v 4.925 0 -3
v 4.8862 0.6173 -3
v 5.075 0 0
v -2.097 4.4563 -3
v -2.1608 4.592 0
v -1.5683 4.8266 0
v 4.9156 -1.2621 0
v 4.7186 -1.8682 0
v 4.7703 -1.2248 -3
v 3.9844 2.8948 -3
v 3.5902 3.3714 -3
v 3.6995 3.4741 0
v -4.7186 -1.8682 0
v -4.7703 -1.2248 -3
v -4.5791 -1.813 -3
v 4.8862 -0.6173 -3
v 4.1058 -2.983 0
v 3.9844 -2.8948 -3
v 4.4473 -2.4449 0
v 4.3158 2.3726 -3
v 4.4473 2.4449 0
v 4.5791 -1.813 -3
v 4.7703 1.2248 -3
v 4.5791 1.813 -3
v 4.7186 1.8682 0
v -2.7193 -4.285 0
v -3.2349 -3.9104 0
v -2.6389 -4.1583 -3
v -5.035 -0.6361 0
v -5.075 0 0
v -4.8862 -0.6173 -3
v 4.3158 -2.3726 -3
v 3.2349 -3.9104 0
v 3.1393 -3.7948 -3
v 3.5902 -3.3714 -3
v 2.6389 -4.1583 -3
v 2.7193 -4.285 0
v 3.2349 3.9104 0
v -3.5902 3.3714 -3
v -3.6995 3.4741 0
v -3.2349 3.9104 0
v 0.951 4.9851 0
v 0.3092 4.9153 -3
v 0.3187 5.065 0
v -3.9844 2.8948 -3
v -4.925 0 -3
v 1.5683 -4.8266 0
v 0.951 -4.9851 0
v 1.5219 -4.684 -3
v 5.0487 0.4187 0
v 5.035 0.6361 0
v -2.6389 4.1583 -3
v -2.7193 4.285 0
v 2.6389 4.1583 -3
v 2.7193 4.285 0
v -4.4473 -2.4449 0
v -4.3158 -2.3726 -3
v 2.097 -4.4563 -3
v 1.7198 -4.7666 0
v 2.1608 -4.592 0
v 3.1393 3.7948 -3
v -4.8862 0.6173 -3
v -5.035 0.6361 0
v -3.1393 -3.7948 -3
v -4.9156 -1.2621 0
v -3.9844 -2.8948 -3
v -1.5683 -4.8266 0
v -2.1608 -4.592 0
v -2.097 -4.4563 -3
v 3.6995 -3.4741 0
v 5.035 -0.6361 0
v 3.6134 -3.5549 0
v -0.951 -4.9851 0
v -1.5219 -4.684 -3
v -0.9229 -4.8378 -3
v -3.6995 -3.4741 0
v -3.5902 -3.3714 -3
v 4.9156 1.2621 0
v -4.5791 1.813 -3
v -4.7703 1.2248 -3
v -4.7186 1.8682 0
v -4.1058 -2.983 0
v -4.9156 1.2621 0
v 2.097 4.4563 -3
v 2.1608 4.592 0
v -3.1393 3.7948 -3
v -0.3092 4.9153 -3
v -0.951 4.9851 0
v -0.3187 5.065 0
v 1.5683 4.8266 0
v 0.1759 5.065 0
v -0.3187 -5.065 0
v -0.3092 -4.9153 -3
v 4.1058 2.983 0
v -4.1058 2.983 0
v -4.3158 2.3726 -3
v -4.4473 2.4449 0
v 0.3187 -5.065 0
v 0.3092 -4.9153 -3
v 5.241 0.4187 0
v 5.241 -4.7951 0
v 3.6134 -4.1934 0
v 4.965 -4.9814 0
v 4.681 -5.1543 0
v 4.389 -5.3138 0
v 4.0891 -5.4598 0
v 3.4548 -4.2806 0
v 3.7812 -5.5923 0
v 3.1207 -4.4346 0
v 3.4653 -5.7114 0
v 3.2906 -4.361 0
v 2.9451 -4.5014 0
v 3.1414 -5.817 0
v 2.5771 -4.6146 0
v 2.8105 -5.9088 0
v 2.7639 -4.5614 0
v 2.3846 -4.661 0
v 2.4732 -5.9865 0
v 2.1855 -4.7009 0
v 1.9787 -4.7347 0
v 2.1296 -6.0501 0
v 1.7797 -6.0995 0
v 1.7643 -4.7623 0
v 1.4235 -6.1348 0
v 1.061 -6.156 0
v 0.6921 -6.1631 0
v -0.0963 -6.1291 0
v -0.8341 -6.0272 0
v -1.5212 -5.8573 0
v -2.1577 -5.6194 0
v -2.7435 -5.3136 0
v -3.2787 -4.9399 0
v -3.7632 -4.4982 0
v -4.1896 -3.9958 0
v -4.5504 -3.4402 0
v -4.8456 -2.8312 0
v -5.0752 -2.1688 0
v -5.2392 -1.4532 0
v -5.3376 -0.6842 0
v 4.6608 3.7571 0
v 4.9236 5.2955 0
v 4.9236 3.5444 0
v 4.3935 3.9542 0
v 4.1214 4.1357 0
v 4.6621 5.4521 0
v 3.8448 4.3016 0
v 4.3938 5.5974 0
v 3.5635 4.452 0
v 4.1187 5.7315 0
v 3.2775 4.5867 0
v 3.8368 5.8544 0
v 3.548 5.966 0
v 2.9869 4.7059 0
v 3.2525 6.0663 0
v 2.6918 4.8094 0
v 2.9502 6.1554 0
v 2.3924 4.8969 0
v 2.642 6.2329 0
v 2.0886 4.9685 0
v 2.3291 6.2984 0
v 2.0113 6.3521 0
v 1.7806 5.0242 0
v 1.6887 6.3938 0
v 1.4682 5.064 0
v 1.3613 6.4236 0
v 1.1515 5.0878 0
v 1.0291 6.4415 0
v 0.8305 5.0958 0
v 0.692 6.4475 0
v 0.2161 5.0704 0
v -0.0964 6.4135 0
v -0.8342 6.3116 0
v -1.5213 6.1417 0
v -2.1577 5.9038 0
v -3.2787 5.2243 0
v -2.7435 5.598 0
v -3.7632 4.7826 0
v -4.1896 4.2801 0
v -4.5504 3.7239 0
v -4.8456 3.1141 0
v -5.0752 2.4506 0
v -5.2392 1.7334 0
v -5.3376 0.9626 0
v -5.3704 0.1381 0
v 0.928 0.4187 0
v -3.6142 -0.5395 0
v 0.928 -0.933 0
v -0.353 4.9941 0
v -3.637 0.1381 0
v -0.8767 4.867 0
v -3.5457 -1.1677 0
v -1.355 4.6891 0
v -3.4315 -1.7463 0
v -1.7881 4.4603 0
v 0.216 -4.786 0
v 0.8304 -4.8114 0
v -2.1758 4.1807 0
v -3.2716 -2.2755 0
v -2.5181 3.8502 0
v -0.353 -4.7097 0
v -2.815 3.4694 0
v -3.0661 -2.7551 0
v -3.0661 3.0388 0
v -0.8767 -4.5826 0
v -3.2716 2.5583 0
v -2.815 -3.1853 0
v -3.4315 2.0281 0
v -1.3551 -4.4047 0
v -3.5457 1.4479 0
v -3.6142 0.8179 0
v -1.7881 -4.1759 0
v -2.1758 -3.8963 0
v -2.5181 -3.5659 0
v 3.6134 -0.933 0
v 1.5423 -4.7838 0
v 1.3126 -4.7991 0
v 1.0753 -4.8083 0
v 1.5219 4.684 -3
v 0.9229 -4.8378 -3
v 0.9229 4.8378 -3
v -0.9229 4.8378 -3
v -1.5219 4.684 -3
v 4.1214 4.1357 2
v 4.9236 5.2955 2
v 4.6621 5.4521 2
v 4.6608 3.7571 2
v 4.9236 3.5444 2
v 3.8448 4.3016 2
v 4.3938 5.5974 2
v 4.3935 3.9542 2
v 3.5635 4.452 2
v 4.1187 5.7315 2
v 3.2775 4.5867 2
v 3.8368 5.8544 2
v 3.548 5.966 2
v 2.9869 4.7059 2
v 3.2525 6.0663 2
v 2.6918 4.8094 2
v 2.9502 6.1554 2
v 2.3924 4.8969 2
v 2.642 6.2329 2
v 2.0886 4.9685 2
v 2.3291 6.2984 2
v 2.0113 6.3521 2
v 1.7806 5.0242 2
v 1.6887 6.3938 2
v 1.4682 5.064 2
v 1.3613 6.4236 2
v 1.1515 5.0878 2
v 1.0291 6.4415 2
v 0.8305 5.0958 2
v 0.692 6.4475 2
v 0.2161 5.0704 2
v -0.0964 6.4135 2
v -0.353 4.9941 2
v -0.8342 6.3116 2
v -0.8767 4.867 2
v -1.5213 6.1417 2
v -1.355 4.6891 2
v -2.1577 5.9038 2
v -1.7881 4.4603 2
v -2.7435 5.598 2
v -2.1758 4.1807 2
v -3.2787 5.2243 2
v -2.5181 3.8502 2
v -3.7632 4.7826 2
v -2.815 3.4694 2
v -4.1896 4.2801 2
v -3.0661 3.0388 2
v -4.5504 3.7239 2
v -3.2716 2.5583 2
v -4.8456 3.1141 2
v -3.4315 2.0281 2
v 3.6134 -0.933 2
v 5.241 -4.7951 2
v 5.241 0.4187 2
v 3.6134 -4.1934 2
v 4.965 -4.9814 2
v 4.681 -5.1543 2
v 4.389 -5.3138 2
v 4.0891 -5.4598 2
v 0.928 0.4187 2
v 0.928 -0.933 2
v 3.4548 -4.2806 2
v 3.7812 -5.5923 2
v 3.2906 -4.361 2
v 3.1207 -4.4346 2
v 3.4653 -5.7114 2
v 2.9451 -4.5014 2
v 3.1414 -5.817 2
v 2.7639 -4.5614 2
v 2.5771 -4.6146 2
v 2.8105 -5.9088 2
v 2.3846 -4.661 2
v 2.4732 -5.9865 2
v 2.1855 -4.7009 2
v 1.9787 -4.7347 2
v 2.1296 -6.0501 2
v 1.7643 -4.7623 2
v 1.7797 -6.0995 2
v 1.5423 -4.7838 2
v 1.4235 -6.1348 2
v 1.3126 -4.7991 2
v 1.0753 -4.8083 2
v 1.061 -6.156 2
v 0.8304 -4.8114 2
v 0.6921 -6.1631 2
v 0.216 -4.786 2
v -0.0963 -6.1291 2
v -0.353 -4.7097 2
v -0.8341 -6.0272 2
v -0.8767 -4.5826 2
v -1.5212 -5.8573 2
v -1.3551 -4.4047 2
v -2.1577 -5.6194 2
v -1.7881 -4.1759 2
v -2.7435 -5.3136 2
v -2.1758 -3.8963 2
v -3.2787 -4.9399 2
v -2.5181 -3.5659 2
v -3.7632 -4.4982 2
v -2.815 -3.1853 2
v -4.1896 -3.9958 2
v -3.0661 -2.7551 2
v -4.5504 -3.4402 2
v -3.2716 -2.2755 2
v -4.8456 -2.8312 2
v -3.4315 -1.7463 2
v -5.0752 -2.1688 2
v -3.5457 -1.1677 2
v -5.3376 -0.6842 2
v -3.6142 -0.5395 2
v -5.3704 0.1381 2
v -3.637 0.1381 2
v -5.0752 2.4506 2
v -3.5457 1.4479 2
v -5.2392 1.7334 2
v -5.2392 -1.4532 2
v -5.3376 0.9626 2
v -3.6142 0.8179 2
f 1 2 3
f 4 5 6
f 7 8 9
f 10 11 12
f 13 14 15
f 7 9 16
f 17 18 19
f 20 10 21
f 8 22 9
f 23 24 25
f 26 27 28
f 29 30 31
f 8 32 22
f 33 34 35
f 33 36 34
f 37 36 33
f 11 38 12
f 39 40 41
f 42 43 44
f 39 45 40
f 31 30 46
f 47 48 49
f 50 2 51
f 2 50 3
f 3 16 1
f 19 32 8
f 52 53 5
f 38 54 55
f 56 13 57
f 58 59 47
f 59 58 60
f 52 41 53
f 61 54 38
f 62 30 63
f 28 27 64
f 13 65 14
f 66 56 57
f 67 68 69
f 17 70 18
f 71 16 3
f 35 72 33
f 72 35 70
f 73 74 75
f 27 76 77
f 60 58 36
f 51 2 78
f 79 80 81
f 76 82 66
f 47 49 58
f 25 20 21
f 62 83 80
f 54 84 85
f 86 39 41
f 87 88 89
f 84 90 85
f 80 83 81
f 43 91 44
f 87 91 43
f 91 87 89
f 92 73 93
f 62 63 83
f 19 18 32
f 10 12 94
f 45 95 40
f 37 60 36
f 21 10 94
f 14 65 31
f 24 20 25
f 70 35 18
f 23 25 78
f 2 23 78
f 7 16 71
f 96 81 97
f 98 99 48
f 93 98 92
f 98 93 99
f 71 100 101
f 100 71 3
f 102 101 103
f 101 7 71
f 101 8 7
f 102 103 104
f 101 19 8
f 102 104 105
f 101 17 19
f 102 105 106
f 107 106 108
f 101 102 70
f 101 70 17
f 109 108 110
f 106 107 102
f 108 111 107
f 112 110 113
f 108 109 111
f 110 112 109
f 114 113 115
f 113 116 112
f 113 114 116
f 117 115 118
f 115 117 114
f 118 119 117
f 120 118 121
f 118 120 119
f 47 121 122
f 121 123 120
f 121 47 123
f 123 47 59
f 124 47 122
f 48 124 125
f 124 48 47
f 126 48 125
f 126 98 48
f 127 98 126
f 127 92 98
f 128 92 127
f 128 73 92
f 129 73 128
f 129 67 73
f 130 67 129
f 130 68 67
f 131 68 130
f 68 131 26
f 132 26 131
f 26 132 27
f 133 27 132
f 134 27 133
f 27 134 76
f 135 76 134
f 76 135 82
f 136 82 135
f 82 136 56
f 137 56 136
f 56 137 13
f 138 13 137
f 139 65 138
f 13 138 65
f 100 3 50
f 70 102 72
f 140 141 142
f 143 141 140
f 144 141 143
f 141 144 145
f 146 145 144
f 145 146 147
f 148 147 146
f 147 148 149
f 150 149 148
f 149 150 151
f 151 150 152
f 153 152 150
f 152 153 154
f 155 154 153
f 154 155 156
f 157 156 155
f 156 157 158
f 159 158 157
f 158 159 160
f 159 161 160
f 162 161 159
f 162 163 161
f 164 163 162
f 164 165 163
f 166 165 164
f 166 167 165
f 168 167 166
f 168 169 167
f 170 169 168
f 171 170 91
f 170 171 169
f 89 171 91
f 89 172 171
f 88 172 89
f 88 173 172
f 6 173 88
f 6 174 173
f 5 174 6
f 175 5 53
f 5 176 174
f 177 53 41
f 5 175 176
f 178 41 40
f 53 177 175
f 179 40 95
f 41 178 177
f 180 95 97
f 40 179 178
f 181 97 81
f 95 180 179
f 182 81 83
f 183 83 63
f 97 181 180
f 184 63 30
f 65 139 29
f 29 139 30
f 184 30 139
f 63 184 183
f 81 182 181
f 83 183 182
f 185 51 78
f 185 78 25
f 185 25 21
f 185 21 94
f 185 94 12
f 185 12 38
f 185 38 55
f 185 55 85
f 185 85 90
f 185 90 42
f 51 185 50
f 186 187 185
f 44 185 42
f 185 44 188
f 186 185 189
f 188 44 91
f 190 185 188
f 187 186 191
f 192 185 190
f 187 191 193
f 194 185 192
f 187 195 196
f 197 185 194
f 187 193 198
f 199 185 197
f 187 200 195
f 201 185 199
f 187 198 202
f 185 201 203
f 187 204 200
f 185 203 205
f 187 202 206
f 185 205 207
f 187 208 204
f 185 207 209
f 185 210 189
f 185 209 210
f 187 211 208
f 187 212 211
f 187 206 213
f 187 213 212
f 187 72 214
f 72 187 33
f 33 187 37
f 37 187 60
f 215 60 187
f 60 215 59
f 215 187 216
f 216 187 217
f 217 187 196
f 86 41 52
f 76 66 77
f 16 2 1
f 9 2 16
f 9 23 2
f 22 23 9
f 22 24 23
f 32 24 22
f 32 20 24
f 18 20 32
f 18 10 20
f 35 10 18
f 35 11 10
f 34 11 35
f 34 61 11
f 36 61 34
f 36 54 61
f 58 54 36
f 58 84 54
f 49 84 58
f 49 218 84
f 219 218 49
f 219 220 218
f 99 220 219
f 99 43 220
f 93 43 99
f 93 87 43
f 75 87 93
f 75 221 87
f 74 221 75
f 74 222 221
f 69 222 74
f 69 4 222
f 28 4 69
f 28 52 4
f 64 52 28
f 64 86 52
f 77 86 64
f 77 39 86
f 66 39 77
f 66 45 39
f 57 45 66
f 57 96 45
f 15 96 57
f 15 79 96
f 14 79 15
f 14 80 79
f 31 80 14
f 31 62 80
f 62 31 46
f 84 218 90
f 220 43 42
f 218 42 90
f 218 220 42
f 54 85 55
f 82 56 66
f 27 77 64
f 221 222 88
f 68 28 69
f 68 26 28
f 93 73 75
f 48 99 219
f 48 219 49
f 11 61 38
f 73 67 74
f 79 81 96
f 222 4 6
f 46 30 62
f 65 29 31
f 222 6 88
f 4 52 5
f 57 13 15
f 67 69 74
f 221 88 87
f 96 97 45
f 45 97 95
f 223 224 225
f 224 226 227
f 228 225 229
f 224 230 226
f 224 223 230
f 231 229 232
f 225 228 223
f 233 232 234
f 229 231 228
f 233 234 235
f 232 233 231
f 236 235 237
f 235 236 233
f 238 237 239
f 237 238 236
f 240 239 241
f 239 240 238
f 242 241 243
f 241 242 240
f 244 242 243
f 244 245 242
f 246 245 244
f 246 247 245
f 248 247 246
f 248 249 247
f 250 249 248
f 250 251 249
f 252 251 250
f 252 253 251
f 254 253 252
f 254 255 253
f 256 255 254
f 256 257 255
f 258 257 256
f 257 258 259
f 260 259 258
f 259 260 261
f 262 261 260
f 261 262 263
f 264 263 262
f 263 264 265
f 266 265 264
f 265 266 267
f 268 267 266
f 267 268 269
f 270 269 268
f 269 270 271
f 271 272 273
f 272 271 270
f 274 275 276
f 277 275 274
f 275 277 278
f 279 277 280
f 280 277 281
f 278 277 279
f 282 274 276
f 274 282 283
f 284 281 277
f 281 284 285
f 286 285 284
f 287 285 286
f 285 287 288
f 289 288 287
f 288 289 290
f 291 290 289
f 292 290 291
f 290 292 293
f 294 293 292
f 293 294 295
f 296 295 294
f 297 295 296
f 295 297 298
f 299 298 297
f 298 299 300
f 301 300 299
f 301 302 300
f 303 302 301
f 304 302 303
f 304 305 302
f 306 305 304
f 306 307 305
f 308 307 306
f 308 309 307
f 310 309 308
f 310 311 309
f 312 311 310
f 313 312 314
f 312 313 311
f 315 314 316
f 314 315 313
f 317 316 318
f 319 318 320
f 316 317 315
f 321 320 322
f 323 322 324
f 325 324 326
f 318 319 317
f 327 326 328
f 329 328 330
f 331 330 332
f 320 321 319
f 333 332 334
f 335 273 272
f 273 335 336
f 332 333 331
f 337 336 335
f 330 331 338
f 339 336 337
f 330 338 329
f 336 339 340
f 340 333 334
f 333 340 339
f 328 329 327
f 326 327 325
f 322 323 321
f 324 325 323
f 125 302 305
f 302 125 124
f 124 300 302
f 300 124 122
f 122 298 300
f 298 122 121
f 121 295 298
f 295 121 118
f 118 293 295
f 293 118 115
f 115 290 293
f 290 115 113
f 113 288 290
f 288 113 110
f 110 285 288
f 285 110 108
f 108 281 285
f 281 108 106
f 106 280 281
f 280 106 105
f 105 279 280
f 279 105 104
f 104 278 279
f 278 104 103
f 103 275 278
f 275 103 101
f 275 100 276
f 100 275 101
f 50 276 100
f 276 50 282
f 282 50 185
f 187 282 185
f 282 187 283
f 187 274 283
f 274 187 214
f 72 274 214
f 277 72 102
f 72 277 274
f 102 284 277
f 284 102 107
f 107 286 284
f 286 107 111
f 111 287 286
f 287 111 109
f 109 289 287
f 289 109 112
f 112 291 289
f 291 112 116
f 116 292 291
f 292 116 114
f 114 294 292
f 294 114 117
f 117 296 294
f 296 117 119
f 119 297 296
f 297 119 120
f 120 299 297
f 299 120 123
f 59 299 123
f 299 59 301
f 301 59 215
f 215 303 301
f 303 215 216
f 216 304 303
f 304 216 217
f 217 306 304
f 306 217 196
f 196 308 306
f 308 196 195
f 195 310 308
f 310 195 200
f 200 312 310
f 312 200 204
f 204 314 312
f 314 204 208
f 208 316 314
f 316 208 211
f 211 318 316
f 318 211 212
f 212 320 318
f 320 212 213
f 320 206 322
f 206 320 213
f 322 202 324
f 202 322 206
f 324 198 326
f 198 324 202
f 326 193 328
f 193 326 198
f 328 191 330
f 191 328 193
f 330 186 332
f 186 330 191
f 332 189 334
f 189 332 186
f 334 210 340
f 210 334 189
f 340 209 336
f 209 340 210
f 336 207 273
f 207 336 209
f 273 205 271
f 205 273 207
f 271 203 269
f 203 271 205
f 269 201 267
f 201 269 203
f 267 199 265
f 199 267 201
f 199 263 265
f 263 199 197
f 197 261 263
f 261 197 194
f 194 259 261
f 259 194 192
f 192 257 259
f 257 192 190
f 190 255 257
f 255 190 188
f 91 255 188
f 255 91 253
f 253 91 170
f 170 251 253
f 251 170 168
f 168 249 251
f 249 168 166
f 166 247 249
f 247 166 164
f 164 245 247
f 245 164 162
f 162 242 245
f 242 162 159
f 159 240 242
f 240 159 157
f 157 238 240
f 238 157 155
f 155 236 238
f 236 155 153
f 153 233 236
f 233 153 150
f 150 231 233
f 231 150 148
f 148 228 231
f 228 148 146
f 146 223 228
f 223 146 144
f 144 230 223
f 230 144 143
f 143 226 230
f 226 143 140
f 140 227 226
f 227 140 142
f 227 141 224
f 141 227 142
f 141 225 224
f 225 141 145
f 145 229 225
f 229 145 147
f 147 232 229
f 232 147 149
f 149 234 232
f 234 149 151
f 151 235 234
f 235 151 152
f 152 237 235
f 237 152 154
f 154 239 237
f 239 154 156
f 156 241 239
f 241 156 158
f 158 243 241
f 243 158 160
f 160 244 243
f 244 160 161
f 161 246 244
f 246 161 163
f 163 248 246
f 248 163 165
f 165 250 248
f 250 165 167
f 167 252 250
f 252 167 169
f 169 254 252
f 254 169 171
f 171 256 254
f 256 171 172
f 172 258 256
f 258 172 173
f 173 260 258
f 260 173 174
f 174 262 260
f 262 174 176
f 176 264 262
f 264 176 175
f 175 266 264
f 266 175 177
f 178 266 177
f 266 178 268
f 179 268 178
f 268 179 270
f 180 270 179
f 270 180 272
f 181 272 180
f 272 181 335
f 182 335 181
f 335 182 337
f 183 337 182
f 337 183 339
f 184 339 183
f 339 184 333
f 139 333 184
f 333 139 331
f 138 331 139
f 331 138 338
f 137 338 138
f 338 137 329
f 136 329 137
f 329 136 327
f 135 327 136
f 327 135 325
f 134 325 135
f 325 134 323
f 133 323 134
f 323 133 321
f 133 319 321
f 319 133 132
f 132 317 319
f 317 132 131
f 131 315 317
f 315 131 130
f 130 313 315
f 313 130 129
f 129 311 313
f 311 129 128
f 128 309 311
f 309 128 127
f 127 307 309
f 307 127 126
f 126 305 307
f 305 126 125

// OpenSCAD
$fn = 50;

difference() {
	union() {
		translate(v = [0, 0, -3.0]) {
			cylinder(h = 3, r1 = 4.925, r2 = 5.075);
		}
		linear_extrude(height = 2) {
			text(font = "Impact", halign = "center", size = 12, text = "G", valign = "center");
		}
	}
	union();
}
